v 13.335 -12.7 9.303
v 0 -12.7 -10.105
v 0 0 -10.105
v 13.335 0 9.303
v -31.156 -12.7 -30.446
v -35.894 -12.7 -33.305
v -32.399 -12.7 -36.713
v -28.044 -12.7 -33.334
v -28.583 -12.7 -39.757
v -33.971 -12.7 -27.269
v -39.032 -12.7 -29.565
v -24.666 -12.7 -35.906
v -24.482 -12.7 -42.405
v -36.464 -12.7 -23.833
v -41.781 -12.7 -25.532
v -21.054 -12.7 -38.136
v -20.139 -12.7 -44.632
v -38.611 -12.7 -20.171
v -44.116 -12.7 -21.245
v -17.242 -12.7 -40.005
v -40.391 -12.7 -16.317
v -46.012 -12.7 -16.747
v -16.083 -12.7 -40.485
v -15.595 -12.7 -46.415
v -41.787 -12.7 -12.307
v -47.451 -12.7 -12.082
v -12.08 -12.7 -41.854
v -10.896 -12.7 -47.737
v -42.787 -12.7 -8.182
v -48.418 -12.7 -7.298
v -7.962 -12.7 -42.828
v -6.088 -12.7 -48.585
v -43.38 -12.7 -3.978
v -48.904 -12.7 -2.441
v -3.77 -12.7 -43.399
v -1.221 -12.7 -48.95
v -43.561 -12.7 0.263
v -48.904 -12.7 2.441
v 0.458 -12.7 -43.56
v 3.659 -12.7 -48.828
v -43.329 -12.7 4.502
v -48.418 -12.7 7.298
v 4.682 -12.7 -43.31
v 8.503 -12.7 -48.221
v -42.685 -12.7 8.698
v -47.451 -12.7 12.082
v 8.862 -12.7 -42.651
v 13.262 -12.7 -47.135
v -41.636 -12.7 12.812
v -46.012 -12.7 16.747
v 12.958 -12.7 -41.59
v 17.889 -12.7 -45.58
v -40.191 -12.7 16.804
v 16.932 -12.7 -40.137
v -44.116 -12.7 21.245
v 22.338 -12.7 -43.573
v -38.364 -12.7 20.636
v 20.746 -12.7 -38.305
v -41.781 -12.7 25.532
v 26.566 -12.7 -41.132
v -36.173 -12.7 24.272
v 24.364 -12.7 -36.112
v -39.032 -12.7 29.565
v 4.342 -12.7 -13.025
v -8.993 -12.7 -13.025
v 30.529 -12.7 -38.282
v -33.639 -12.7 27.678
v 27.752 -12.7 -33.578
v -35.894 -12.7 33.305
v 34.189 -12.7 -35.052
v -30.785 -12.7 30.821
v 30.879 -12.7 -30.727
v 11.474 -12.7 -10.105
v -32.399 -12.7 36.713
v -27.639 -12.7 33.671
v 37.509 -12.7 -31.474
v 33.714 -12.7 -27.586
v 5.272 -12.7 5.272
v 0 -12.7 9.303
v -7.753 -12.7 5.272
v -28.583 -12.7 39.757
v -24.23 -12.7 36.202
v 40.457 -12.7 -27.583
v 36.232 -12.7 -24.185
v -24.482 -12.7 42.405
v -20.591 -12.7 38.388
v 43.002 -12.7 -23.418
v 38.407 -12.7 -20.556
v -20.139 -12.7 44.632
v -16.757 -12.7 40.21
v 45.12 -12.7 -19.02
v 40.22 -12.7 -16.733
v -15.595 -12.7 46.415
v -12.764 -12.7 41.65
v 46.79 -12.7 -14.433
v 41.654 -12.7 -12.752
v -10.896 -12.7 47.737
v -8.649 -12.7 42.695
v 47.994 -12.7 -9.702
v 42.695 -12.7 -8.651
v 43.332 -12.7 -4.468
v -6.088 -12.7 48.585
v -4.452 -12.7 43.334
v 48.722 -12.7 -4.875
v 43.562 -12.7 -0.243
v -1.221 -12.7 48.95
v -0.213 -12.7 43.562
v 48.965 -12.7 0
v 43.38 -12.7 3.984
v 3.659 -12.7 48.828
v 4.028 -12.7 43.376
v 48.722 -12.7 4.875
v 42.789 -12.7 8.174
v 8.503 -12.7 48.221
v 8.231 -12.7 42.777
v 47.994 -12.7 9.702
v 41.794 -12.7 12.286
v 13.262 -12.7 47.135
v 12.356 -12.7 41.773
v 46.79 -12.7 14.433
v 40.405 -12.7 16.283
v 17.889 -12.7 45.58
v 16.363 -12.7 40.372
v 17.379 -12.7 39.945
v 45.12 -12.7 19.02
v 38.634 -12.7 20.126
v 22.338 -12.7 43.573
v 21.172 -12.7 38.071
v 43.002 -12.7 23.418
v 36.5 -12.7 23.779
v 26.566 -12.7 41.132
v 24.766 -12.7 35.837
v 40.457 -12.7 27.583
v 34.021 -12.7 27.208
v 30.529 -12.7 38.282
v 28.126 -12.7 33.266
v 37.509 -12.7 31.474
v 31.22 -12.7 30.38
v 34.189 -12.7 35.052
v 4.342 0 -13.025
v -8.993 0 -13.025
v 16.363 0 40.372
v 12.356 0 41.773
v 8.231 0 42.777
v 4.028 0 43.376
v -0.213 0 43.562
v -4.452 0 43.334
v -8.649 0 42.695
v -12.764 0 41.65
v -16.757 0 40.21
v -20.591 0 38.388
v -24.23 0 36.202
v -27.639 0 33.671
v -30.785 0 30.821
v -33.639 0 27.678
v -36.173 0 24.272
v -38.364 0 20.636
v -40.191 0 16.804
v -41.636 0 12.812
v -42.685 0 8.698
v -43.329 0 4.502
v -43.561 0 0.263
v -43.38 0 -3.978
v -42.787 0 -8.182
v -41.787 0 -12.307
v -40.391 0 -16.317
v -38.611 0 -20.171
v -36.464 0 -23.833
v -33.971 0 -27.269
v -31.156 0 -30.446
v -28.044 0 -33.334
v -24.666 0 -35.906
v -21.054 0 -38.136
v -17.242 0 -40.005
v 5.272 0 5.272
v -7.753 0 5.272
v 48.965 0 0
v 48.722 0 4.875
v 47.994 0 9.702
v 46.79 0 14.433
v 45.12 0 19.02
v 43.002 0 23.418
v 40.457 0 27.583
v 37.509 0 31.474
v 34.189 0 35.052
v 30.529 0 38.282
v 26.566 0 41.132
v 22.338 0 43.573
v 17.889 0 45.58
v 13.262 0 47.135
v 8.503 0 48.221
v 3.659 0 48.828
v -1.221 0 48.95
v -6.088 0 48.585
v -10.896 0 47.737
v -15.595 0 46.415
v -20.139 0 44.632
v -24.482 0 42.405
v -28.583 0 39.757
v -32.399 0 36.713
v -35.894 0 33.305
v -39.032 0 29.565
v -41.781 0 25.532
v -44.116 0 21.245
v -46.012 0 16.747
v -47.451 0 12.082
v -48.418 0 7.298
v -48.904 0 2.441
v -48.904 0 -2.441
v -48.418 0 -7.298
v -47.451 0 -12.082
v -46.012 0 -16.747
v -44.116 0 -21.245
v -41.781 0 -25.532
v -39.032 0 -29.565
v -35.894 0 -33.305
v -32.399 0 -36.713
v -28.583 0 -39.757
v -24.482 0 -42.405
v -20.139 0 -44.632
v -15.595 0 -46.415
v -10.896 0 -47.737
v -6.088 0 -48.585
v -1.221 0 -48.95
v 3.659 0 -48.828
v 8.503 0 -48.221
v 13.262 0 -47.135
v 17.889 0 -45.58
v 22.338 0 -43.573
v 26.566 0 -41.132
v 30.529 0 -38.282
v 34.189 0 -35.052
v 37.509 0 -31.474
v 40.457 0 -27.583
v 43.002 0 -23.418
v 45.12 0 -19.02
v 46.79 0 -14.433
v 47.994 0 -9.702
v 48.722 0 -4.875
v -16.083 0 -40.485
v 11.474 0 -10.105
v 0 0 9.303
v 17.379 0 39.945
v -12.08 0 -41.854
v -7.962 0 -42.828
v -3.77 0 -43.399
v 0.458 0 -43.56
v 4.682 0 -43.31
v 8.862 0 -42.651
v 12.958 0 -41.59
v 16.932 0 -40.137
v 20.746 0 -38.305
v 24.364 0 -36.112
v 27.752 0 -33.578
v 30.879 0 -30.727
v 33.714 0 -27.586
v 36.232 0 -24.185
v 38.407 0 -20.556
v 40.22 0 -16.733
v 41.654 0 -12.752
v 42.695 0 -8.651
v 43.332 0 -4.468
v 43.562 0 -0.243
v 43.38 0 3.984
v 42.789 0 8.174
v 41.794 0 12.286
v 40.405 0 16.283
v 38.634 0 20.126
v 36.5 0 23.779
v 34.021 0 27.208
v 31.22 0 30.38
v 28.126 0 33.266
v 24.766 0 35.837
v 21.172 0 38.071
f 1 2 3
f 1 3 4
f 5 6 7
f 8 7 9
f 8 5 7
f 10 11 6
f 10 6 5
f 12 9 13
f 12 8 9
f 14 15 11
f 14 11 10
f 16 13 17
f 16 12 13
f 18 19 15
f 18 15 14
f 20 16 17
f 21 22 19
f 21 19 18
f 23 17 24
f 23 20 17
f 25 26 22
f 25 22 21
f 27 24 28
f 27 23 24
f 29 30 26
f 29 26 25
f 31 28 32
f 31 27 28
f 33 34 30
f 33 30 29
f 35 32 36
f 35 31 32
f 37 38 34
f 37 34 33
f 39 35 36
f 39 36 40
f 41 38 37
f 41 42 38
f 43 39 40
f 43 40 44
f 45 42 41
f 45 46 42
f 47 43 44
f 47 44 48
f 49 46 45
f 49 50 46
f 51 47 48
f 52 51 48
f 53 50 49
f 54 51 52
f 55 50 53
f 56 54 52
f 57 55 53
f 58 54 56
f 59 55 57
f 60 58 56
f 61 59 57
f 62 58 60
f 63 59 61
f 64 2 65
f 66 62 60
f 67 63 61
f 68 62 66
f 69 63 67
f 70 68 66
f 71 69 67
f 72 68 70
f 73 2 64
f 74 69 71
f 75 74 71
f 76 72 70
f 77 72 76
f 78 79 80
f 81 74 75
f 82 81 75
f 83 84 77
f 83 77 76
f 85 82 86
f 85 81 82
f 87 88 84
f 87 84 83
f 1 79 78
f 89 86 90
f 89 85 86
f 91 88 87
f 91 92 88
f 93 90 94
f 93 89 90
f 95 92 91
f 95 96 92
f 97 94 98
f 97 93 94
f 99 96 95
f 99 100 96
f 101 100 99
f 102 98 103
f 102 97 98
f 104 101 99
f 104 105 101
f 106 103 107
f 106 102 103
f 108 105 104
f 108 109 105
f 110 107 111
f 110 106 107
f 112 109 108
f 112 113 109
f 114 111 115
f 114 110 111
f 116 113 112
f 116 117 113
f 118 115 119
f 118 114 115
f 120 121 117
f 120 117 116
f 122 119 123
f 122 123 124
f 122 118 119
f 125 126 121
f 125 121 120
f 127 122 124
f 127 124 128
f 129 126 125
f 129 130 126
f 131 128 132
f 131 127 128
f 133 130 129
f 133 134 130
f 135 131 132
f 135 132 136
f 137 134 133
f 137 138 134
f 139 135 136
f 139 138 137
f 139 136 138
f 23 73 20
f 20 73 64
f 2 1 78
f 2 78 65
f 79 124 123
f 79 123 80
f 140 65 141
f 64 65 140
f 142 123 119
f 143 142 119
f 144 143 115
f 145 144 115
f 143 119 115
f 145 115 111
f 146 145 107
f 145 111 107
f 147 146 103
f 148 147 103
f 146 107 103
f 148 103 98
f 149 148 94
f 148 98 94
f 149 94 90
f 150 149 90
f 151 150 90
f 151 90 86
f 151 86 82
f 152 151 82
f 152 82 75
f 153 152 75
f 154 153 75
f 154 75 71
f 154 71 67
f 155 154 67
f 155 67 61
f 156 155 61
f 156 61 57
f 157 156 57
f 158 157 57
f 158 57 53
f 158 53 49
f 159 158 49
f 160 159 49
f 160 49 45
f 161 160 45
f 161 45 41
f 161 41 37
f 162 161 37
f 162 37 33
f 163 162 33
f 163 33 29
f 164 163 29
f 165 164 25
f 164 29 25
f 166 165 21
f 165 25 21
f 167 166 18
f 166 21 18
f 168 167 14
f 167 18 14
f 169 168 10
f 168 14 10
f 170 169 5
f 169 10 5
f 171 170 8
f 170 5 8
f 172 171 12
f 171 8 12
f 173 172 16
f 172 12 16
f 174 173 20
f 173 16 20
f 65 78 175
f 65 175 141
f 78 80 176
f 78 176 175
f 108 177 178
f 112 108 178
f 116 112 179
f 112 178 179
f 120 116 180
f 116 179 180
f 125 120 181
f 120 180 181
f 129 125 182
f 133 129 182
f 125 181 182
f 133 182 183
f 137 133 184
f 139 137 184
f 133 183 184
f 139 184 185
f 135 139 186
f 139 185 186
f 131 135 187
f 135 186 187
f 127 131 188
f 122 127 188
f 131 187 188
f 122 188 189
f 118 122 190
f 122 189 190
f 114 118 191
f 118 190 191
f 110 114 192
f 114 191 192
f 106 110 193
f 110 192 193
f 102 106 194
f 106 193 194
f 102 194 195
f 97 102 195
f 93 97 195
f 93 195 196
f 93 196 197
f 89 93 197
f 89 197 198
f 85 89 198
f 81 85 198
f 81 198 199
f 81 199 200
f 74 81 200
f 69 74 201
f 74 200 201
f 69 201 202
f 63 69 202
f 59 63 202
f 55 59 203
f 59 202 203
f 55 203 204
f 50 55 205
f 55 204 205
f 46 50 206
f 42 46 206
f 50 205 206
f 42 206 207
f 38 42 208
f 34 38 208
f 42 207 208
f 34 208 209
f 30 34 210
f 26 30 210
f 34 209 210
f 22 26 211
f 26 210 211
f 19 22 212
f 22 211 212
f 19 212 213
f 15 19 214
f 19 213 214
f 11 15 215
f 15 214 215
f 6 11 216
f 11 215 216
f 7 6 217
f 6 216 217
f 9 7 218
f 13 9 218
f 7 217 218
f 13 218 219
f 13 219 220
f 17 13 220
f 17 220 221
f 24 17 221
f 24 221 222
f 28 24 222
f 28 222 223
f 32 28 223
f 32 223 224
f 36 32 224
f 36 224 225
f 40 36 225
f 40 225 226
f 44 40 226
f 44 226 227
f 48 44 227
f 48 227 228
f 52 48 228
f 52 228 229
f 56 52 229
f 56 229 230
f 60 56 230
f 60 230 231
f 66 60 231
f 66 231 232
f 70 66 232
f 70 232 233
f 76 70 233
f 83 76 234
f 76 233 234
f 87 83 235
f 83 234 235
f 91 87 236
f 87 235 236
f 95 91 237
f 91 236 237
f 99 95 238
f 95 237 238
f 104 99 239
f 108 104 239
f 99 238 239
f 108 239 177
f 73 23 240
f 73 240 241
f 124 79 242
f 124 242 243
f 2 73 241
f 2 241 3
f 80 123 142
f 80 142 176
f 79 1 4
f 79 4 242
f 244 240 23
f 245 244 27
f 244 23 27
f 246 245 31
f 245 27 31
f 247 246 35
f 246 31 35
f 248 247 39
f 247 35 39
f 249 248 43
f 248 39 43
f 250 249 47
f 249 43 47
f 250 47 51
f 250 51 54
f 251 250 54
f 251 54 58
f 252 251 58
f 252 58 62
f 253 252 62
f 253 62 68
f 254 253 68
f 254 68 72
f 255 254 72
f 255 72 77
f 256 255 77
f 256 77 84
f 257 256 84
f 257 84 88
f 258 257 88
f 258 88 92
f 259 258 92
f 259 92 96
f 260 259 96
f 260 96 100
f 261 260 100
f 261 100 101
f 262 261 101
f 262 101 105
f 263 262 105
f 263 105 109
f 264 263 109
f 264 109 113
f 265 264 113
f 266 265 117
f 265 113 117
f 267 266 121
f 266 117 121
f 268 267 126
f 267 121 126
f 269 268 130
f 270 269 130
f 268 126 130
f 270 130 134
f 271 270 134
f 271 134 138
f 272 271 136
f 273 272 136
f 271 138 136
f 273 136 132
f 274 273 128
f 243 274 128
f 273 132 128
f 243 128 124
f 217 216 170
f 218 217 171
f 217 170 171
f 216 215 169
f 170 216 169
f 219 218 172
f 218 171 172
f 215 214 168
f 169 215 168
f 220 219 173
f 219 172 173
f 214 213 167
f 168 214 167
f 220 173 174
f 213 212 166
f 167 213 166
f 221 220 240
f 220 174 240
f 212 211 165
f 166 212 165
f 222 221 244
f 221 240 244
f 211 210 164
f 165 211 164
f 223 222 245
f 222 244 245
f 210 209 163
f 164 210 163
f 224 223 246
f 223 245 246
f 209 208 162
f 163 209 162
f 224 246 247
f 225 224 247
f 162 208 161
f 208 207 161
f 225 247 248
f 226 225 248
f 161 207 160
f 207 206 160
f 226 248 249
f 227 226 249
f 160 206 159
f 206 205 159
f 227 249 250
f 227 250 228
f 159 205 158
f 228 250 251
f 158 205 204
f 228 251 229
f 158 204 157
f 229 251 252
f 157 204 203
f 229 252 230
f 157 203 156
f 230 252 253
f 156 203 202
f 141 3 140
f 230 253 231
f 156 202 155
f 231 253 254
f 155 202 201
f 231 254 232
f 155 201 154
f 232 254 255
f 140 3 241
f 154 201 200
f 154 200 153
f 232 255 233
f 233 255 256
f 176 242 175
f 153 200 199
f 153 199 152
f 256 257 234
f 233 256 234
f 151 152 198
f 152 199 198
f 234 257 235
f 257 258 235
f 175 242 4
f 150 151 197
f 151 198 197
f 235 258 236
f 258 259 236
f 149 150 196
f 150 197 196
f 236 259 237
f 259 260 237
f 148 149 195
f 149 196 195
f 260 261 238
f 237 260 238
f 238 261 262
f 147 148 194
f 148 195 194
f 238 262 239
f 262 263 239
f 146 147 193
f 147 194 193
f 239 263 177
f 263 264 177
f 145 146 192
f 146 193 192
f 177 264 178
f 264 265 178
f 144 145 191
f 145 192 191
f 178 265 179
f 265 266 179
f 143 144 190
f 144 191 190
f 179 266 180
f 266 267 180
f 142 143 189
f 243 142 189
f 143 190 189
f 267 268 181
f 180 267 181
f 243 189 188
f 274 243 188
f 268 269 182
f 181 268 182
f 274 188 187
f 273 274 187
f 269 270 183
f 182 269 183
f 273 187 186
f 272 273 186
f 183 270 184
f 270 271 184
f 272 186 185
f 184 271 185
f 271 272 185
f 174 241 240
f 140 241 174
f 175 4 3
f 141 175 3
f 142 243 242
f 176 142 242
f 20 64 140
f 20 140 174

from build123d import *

# Parameters (mm, degrees)
F0_R     = 48.9649925961
F1_DEPTH = 12.7
F2_R     = 43.5622333877
F3_DEPTH = 12.7
F5_DEPTH = 12.7


with BuildPart() as f1:
    # F0 (on Front) → F1 (new body)
    with BuildSketch(Plane.XZ):
        Circle(F0_R)
    extrude(amount=F1_DEPTH)

    # F2 (on face) → F3 (cut)
    with BuildSketch(Plane.XZ.offset(12.7)):
        Circle(F2_R)
    extrude(amount=-F3_DEPTH, mode=Mode.SUBTRACT)

    # F4 (on face) → F5 (join)
    with BuildSketch(Plane.XZ.offset(12.7)):
        with BuildLine():
            ThreePointArc((17.379015252, 39.9454378696), (16.8725994385, 40.1619666589), (16.363486545, 40.3720755698))
            Line((16.363486545, 40.3720755698), (-7.7529065311, 5.2719768137))
            Line((-7.7529065311, 5.2719768137), (5.271977745, 5.2719768137))
            Line((5.271977745, 5.2719768137), (-8.9933723211, -13.0248842761))
            Line((-8.9933723211, -13.0248842761), (4.3416288681, -13.0248842761))
            Line((4.3416288681, -13.0248842761), (-17.2422079718, -40.004680251))
            ThreePointArc((-17.2422079718, -40.004680251), (-16.6644241691, -40.2487906009), (-16.0831855031, -40.4845565839))
            Line((-16.0831855031, -40.4845565839), (11.4743020386, -10.1048769623))
            Line((11.4743020386, -10.1048769623), (0, -10.1048769623))
            Line((0, -10.1048769623), (13.334998861, 9.3034887686))
            Line((13.334998861, 9.3034887686), (0, 9.3034887686))
            Line((0, 9.3034887686), (17.379015252, 39.9454378696))
        make_face()
    extrude(amount=-F5_DEPTH)


solid = f1.part
